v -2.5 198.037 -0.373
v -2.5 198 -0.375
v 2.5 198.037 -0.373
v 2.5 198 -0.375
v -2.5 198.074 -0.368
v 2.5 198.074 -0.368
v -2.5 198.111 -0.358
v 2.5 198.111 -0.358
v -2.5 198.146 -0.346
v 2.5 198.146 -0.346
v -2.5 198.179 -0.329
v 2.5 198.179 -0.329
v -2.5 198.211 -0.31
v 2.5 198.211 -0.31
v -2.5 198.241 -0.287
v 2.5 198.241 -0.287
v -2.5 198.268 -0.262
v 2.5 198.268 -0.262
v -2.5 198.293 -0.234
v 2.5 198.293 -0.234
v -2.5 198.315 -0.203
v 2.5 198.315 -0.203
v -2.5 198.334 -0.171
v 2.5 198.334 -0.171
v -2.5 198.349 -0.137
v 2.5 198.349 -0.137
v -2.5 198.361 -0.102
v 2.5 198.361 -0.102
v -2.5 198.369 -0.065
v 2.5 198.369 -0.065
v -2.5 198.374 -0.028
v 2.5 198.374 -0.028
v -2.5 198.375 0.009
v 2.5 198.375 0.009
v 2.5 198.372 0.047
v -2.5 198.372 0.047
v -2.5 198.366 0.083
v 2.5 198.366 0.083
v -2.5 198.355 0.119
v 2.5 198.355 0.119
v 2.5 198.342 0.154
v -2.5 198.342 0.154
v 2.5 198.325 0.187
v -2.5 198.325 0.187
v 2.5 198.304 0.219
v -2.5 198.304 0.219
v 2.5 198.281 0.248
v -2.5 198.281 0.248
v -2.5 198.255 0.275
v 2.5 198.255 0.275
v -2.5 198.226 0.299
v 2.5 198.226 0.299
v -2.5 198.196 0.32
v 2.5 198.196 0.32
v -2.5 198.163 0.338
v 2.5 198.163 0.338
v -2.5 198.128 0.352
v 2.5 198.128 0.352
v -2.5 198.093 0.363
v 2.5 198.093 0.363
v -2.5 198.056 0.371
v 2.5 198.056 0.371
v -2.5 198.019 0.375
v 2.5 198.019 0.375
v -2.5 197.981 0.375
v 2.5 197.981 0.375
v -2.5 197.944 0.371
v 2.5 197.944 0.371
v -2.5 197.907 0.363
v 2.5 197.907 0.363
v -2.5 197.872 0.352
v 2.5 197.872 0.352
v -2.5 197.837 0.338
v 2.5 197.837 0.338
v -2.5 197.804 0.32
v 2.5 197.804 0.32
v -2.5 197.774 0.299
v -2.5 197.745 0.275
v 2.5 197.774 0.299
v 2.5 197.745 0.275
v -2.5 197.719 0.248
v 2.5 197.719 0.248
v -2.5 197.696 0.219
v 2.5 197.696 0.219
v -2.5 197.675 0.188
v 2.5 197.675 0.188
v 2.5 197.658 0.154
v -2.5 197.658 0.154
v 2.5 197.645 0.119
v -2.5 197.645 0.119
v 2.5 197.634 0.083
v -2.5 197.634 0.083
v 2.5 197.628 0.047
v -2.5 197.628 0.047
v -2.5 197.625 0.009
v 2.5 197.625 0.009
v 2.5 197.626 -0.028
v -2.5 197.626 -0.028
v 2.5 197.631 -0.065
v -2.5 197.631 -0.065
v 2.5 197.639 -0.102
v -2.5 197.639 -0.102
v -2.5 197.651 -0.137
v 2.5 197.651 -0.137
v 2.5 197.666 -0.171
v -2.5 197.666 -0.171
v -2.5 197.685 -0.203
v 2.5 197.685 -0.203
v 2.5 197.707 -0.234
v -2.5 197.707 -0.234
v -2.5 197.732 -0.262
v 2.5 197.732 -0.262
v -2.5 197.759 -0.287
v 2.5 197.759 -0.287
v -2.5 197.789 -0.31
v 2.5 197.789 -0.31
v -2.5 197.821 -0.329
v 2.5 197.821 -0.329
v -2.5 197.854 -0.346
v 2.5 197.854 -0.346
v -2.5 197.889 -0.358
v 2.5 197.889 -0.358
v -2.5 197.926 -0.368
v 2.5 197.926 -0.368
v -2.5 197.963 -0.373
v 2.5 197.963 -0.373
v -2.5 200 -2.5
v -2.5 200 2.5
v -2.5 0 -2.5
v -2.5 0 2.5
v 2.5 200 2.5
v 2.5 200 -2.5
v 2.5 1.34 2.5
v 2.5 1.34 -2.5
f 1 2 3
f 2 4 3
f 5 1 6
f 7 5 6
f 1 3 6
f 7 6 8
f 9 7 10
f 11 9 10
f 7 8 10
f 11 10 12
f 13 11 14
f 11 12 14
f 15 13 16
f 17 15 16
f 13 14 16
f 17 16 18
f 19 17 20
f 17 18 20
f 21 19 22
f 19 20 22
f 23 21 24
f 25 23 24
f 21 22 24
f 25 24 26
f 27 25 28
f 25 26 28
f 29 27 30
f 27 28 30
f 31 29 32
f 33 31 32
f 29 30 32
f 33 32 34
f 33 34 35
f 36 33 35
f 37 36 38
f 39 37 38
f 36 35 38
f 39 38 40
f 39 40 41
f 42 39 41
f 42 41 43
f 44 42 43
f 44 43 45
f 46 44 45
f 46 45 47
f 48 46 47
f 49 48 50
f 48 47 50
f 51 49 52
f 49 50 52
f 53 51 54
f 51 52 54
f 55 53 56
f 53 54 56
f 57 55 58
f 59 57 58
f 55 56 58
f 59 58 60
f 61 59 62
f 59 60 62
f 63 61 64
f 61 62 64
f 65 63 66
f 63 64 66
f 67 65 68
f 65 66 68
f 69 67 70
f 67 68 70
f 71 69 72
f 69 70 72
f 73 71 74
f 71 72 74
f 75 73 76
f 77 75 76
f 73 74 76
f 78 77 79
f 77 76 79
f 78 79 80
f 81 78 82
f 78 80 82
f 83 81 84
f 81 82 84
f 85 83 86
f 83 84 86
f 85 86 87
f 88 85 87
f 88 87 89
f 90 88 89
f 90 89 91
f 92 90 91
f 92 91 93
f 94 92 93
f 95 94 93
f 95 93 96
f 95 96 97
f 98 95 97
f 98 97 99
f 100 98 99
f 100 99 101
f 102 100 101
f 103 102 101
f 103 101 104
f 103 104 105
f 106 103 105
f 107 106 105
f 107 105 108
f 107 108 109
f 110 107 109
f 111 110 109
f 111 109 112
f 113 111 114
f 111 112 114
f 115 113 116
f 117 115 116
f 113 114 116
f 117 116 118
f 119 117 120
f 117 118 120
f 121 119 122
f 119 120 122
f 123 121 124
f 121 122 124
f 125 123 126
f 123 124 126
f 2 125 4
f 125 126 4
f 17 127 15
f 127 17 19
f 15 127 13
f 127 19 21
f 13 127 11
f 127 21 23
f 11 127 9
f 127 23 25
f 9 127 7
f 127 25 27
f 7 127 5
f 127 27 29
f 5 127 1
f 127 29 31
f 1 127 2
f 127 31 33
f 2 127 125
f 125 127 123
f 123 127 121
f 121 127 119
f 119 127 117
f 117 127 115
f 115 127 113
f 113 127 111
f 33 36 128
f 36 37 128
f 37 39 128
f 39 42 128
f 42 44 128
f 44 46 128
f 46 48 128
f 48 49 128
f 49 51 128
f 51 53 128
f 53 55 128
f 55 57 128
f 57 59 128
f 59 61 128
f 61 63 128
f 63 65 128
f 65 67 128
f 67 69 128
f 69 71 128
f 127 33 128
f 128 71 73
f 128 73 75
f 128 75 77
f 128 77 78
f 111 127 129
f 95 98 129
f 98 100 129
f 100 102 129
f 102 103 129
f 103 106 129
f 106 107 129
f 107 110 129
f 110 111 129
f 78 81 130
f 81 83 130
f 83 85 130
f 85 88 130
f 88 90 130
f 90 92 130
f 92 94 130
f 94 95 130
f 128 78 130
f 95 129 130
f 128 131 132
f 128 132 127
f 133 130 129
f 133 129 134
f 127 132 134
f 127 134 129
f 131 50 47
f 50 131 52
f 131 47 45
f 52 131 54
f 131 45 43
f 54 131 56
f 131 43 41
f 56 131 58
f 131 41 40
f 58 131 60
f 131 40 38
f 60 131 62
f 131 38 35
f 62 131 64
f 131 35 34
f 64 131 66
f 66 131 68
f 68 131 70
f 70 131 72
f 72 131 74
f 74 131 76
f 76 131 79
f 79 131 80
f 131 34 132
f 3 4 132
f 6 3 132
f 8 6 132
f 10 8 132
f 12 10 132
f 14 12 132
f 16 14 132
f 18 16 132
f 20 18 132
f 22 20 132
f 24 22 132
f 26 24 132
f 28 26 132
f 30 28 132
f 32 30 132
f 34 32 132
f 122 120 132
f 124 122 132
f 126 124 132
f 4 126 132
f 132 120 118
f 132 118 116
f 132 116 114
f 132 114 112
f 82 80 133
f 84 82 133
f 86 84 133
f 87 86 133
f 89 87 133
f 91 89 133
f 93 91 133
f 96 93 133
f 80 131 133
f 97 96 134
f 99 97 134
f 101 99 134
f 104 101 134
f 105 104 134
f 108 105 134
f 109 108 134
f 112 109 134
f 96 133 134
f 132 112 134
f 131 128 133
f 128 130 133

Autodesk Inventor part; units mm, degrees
ref_plane "YZ Plane" through (0, 0, 0) normal (1, 0, 0) x (0, 1, 0)
ref_plane "XZ Plane" through (0, 0, 0) normal (0, 1, 0) x (-1, 0, 0)
ref_plane "XY Plane" through (0, 0, 0) normal (0, 0, 1) x (1, 0, 0)
sketch "Sketch1" plane through (0, 0, 0) normal (0, 1, 0) x (-1, 0, 0)
  line L0 (2.5, 2.5) -> (-2.5, 2.5)
  line L1 (-2.5, 2.5) -> (-2.5, -2.5)
  line L2 (-2.5, -2.5) -> (2.5, -2.5)
  line L3 (2.5, -2.5) -> (2.5, 2.5)
  point P0 (0, 0)
  dimension "d0" = 5
  dimension "d1" = 5
  dimension "d2" = 2.5
  dimension "d3" = 2.5
extrude "Extrusion1" add sketch "Sketch1" along normal blind 200
sketch "Sketch3" plane through (2.5, 200, 2.5) normal (1, 0, 0) x (0, 0, -1)
  circle A0 centre (2.5, -2) radius 0.375
  line L0 (0, 0) -> (5, 0) projected
  line L1 (5, -200) -> (5, 0) projected
  point P0 (2.5, -200)
  point P1 (5, -198.6603)
  dimension "d9" = 0.75
  dimension "d10" = 2
  dimension "d11" = 2.5
extrude "Extrusion3" cut sketch "Sketch3" against normal blind 200
sketch "Sketch4" plane through (-2.5, 0, 2.5) normal (0, 0, 1) x (1, 0, 0)
  line L0 (5, 0) -> (0, 0) projected
  line L1 (0, 0) -> (5, 1.3397)
  line L2 (5, 0) -> (5, 200) projected
  line L3 (0, 0) -> (5.1764, 0) construction
  line L4 (5, 1.3397) -> (5, 0)
  line L5 (5, 0) -> (0, 0)
  point P0 (2.5, 0)
  dimension "d14" = 15
extrude "Extrusion4" cut sketch "Sketch4" against normal blind 200
properties part number "Stand Leg"
